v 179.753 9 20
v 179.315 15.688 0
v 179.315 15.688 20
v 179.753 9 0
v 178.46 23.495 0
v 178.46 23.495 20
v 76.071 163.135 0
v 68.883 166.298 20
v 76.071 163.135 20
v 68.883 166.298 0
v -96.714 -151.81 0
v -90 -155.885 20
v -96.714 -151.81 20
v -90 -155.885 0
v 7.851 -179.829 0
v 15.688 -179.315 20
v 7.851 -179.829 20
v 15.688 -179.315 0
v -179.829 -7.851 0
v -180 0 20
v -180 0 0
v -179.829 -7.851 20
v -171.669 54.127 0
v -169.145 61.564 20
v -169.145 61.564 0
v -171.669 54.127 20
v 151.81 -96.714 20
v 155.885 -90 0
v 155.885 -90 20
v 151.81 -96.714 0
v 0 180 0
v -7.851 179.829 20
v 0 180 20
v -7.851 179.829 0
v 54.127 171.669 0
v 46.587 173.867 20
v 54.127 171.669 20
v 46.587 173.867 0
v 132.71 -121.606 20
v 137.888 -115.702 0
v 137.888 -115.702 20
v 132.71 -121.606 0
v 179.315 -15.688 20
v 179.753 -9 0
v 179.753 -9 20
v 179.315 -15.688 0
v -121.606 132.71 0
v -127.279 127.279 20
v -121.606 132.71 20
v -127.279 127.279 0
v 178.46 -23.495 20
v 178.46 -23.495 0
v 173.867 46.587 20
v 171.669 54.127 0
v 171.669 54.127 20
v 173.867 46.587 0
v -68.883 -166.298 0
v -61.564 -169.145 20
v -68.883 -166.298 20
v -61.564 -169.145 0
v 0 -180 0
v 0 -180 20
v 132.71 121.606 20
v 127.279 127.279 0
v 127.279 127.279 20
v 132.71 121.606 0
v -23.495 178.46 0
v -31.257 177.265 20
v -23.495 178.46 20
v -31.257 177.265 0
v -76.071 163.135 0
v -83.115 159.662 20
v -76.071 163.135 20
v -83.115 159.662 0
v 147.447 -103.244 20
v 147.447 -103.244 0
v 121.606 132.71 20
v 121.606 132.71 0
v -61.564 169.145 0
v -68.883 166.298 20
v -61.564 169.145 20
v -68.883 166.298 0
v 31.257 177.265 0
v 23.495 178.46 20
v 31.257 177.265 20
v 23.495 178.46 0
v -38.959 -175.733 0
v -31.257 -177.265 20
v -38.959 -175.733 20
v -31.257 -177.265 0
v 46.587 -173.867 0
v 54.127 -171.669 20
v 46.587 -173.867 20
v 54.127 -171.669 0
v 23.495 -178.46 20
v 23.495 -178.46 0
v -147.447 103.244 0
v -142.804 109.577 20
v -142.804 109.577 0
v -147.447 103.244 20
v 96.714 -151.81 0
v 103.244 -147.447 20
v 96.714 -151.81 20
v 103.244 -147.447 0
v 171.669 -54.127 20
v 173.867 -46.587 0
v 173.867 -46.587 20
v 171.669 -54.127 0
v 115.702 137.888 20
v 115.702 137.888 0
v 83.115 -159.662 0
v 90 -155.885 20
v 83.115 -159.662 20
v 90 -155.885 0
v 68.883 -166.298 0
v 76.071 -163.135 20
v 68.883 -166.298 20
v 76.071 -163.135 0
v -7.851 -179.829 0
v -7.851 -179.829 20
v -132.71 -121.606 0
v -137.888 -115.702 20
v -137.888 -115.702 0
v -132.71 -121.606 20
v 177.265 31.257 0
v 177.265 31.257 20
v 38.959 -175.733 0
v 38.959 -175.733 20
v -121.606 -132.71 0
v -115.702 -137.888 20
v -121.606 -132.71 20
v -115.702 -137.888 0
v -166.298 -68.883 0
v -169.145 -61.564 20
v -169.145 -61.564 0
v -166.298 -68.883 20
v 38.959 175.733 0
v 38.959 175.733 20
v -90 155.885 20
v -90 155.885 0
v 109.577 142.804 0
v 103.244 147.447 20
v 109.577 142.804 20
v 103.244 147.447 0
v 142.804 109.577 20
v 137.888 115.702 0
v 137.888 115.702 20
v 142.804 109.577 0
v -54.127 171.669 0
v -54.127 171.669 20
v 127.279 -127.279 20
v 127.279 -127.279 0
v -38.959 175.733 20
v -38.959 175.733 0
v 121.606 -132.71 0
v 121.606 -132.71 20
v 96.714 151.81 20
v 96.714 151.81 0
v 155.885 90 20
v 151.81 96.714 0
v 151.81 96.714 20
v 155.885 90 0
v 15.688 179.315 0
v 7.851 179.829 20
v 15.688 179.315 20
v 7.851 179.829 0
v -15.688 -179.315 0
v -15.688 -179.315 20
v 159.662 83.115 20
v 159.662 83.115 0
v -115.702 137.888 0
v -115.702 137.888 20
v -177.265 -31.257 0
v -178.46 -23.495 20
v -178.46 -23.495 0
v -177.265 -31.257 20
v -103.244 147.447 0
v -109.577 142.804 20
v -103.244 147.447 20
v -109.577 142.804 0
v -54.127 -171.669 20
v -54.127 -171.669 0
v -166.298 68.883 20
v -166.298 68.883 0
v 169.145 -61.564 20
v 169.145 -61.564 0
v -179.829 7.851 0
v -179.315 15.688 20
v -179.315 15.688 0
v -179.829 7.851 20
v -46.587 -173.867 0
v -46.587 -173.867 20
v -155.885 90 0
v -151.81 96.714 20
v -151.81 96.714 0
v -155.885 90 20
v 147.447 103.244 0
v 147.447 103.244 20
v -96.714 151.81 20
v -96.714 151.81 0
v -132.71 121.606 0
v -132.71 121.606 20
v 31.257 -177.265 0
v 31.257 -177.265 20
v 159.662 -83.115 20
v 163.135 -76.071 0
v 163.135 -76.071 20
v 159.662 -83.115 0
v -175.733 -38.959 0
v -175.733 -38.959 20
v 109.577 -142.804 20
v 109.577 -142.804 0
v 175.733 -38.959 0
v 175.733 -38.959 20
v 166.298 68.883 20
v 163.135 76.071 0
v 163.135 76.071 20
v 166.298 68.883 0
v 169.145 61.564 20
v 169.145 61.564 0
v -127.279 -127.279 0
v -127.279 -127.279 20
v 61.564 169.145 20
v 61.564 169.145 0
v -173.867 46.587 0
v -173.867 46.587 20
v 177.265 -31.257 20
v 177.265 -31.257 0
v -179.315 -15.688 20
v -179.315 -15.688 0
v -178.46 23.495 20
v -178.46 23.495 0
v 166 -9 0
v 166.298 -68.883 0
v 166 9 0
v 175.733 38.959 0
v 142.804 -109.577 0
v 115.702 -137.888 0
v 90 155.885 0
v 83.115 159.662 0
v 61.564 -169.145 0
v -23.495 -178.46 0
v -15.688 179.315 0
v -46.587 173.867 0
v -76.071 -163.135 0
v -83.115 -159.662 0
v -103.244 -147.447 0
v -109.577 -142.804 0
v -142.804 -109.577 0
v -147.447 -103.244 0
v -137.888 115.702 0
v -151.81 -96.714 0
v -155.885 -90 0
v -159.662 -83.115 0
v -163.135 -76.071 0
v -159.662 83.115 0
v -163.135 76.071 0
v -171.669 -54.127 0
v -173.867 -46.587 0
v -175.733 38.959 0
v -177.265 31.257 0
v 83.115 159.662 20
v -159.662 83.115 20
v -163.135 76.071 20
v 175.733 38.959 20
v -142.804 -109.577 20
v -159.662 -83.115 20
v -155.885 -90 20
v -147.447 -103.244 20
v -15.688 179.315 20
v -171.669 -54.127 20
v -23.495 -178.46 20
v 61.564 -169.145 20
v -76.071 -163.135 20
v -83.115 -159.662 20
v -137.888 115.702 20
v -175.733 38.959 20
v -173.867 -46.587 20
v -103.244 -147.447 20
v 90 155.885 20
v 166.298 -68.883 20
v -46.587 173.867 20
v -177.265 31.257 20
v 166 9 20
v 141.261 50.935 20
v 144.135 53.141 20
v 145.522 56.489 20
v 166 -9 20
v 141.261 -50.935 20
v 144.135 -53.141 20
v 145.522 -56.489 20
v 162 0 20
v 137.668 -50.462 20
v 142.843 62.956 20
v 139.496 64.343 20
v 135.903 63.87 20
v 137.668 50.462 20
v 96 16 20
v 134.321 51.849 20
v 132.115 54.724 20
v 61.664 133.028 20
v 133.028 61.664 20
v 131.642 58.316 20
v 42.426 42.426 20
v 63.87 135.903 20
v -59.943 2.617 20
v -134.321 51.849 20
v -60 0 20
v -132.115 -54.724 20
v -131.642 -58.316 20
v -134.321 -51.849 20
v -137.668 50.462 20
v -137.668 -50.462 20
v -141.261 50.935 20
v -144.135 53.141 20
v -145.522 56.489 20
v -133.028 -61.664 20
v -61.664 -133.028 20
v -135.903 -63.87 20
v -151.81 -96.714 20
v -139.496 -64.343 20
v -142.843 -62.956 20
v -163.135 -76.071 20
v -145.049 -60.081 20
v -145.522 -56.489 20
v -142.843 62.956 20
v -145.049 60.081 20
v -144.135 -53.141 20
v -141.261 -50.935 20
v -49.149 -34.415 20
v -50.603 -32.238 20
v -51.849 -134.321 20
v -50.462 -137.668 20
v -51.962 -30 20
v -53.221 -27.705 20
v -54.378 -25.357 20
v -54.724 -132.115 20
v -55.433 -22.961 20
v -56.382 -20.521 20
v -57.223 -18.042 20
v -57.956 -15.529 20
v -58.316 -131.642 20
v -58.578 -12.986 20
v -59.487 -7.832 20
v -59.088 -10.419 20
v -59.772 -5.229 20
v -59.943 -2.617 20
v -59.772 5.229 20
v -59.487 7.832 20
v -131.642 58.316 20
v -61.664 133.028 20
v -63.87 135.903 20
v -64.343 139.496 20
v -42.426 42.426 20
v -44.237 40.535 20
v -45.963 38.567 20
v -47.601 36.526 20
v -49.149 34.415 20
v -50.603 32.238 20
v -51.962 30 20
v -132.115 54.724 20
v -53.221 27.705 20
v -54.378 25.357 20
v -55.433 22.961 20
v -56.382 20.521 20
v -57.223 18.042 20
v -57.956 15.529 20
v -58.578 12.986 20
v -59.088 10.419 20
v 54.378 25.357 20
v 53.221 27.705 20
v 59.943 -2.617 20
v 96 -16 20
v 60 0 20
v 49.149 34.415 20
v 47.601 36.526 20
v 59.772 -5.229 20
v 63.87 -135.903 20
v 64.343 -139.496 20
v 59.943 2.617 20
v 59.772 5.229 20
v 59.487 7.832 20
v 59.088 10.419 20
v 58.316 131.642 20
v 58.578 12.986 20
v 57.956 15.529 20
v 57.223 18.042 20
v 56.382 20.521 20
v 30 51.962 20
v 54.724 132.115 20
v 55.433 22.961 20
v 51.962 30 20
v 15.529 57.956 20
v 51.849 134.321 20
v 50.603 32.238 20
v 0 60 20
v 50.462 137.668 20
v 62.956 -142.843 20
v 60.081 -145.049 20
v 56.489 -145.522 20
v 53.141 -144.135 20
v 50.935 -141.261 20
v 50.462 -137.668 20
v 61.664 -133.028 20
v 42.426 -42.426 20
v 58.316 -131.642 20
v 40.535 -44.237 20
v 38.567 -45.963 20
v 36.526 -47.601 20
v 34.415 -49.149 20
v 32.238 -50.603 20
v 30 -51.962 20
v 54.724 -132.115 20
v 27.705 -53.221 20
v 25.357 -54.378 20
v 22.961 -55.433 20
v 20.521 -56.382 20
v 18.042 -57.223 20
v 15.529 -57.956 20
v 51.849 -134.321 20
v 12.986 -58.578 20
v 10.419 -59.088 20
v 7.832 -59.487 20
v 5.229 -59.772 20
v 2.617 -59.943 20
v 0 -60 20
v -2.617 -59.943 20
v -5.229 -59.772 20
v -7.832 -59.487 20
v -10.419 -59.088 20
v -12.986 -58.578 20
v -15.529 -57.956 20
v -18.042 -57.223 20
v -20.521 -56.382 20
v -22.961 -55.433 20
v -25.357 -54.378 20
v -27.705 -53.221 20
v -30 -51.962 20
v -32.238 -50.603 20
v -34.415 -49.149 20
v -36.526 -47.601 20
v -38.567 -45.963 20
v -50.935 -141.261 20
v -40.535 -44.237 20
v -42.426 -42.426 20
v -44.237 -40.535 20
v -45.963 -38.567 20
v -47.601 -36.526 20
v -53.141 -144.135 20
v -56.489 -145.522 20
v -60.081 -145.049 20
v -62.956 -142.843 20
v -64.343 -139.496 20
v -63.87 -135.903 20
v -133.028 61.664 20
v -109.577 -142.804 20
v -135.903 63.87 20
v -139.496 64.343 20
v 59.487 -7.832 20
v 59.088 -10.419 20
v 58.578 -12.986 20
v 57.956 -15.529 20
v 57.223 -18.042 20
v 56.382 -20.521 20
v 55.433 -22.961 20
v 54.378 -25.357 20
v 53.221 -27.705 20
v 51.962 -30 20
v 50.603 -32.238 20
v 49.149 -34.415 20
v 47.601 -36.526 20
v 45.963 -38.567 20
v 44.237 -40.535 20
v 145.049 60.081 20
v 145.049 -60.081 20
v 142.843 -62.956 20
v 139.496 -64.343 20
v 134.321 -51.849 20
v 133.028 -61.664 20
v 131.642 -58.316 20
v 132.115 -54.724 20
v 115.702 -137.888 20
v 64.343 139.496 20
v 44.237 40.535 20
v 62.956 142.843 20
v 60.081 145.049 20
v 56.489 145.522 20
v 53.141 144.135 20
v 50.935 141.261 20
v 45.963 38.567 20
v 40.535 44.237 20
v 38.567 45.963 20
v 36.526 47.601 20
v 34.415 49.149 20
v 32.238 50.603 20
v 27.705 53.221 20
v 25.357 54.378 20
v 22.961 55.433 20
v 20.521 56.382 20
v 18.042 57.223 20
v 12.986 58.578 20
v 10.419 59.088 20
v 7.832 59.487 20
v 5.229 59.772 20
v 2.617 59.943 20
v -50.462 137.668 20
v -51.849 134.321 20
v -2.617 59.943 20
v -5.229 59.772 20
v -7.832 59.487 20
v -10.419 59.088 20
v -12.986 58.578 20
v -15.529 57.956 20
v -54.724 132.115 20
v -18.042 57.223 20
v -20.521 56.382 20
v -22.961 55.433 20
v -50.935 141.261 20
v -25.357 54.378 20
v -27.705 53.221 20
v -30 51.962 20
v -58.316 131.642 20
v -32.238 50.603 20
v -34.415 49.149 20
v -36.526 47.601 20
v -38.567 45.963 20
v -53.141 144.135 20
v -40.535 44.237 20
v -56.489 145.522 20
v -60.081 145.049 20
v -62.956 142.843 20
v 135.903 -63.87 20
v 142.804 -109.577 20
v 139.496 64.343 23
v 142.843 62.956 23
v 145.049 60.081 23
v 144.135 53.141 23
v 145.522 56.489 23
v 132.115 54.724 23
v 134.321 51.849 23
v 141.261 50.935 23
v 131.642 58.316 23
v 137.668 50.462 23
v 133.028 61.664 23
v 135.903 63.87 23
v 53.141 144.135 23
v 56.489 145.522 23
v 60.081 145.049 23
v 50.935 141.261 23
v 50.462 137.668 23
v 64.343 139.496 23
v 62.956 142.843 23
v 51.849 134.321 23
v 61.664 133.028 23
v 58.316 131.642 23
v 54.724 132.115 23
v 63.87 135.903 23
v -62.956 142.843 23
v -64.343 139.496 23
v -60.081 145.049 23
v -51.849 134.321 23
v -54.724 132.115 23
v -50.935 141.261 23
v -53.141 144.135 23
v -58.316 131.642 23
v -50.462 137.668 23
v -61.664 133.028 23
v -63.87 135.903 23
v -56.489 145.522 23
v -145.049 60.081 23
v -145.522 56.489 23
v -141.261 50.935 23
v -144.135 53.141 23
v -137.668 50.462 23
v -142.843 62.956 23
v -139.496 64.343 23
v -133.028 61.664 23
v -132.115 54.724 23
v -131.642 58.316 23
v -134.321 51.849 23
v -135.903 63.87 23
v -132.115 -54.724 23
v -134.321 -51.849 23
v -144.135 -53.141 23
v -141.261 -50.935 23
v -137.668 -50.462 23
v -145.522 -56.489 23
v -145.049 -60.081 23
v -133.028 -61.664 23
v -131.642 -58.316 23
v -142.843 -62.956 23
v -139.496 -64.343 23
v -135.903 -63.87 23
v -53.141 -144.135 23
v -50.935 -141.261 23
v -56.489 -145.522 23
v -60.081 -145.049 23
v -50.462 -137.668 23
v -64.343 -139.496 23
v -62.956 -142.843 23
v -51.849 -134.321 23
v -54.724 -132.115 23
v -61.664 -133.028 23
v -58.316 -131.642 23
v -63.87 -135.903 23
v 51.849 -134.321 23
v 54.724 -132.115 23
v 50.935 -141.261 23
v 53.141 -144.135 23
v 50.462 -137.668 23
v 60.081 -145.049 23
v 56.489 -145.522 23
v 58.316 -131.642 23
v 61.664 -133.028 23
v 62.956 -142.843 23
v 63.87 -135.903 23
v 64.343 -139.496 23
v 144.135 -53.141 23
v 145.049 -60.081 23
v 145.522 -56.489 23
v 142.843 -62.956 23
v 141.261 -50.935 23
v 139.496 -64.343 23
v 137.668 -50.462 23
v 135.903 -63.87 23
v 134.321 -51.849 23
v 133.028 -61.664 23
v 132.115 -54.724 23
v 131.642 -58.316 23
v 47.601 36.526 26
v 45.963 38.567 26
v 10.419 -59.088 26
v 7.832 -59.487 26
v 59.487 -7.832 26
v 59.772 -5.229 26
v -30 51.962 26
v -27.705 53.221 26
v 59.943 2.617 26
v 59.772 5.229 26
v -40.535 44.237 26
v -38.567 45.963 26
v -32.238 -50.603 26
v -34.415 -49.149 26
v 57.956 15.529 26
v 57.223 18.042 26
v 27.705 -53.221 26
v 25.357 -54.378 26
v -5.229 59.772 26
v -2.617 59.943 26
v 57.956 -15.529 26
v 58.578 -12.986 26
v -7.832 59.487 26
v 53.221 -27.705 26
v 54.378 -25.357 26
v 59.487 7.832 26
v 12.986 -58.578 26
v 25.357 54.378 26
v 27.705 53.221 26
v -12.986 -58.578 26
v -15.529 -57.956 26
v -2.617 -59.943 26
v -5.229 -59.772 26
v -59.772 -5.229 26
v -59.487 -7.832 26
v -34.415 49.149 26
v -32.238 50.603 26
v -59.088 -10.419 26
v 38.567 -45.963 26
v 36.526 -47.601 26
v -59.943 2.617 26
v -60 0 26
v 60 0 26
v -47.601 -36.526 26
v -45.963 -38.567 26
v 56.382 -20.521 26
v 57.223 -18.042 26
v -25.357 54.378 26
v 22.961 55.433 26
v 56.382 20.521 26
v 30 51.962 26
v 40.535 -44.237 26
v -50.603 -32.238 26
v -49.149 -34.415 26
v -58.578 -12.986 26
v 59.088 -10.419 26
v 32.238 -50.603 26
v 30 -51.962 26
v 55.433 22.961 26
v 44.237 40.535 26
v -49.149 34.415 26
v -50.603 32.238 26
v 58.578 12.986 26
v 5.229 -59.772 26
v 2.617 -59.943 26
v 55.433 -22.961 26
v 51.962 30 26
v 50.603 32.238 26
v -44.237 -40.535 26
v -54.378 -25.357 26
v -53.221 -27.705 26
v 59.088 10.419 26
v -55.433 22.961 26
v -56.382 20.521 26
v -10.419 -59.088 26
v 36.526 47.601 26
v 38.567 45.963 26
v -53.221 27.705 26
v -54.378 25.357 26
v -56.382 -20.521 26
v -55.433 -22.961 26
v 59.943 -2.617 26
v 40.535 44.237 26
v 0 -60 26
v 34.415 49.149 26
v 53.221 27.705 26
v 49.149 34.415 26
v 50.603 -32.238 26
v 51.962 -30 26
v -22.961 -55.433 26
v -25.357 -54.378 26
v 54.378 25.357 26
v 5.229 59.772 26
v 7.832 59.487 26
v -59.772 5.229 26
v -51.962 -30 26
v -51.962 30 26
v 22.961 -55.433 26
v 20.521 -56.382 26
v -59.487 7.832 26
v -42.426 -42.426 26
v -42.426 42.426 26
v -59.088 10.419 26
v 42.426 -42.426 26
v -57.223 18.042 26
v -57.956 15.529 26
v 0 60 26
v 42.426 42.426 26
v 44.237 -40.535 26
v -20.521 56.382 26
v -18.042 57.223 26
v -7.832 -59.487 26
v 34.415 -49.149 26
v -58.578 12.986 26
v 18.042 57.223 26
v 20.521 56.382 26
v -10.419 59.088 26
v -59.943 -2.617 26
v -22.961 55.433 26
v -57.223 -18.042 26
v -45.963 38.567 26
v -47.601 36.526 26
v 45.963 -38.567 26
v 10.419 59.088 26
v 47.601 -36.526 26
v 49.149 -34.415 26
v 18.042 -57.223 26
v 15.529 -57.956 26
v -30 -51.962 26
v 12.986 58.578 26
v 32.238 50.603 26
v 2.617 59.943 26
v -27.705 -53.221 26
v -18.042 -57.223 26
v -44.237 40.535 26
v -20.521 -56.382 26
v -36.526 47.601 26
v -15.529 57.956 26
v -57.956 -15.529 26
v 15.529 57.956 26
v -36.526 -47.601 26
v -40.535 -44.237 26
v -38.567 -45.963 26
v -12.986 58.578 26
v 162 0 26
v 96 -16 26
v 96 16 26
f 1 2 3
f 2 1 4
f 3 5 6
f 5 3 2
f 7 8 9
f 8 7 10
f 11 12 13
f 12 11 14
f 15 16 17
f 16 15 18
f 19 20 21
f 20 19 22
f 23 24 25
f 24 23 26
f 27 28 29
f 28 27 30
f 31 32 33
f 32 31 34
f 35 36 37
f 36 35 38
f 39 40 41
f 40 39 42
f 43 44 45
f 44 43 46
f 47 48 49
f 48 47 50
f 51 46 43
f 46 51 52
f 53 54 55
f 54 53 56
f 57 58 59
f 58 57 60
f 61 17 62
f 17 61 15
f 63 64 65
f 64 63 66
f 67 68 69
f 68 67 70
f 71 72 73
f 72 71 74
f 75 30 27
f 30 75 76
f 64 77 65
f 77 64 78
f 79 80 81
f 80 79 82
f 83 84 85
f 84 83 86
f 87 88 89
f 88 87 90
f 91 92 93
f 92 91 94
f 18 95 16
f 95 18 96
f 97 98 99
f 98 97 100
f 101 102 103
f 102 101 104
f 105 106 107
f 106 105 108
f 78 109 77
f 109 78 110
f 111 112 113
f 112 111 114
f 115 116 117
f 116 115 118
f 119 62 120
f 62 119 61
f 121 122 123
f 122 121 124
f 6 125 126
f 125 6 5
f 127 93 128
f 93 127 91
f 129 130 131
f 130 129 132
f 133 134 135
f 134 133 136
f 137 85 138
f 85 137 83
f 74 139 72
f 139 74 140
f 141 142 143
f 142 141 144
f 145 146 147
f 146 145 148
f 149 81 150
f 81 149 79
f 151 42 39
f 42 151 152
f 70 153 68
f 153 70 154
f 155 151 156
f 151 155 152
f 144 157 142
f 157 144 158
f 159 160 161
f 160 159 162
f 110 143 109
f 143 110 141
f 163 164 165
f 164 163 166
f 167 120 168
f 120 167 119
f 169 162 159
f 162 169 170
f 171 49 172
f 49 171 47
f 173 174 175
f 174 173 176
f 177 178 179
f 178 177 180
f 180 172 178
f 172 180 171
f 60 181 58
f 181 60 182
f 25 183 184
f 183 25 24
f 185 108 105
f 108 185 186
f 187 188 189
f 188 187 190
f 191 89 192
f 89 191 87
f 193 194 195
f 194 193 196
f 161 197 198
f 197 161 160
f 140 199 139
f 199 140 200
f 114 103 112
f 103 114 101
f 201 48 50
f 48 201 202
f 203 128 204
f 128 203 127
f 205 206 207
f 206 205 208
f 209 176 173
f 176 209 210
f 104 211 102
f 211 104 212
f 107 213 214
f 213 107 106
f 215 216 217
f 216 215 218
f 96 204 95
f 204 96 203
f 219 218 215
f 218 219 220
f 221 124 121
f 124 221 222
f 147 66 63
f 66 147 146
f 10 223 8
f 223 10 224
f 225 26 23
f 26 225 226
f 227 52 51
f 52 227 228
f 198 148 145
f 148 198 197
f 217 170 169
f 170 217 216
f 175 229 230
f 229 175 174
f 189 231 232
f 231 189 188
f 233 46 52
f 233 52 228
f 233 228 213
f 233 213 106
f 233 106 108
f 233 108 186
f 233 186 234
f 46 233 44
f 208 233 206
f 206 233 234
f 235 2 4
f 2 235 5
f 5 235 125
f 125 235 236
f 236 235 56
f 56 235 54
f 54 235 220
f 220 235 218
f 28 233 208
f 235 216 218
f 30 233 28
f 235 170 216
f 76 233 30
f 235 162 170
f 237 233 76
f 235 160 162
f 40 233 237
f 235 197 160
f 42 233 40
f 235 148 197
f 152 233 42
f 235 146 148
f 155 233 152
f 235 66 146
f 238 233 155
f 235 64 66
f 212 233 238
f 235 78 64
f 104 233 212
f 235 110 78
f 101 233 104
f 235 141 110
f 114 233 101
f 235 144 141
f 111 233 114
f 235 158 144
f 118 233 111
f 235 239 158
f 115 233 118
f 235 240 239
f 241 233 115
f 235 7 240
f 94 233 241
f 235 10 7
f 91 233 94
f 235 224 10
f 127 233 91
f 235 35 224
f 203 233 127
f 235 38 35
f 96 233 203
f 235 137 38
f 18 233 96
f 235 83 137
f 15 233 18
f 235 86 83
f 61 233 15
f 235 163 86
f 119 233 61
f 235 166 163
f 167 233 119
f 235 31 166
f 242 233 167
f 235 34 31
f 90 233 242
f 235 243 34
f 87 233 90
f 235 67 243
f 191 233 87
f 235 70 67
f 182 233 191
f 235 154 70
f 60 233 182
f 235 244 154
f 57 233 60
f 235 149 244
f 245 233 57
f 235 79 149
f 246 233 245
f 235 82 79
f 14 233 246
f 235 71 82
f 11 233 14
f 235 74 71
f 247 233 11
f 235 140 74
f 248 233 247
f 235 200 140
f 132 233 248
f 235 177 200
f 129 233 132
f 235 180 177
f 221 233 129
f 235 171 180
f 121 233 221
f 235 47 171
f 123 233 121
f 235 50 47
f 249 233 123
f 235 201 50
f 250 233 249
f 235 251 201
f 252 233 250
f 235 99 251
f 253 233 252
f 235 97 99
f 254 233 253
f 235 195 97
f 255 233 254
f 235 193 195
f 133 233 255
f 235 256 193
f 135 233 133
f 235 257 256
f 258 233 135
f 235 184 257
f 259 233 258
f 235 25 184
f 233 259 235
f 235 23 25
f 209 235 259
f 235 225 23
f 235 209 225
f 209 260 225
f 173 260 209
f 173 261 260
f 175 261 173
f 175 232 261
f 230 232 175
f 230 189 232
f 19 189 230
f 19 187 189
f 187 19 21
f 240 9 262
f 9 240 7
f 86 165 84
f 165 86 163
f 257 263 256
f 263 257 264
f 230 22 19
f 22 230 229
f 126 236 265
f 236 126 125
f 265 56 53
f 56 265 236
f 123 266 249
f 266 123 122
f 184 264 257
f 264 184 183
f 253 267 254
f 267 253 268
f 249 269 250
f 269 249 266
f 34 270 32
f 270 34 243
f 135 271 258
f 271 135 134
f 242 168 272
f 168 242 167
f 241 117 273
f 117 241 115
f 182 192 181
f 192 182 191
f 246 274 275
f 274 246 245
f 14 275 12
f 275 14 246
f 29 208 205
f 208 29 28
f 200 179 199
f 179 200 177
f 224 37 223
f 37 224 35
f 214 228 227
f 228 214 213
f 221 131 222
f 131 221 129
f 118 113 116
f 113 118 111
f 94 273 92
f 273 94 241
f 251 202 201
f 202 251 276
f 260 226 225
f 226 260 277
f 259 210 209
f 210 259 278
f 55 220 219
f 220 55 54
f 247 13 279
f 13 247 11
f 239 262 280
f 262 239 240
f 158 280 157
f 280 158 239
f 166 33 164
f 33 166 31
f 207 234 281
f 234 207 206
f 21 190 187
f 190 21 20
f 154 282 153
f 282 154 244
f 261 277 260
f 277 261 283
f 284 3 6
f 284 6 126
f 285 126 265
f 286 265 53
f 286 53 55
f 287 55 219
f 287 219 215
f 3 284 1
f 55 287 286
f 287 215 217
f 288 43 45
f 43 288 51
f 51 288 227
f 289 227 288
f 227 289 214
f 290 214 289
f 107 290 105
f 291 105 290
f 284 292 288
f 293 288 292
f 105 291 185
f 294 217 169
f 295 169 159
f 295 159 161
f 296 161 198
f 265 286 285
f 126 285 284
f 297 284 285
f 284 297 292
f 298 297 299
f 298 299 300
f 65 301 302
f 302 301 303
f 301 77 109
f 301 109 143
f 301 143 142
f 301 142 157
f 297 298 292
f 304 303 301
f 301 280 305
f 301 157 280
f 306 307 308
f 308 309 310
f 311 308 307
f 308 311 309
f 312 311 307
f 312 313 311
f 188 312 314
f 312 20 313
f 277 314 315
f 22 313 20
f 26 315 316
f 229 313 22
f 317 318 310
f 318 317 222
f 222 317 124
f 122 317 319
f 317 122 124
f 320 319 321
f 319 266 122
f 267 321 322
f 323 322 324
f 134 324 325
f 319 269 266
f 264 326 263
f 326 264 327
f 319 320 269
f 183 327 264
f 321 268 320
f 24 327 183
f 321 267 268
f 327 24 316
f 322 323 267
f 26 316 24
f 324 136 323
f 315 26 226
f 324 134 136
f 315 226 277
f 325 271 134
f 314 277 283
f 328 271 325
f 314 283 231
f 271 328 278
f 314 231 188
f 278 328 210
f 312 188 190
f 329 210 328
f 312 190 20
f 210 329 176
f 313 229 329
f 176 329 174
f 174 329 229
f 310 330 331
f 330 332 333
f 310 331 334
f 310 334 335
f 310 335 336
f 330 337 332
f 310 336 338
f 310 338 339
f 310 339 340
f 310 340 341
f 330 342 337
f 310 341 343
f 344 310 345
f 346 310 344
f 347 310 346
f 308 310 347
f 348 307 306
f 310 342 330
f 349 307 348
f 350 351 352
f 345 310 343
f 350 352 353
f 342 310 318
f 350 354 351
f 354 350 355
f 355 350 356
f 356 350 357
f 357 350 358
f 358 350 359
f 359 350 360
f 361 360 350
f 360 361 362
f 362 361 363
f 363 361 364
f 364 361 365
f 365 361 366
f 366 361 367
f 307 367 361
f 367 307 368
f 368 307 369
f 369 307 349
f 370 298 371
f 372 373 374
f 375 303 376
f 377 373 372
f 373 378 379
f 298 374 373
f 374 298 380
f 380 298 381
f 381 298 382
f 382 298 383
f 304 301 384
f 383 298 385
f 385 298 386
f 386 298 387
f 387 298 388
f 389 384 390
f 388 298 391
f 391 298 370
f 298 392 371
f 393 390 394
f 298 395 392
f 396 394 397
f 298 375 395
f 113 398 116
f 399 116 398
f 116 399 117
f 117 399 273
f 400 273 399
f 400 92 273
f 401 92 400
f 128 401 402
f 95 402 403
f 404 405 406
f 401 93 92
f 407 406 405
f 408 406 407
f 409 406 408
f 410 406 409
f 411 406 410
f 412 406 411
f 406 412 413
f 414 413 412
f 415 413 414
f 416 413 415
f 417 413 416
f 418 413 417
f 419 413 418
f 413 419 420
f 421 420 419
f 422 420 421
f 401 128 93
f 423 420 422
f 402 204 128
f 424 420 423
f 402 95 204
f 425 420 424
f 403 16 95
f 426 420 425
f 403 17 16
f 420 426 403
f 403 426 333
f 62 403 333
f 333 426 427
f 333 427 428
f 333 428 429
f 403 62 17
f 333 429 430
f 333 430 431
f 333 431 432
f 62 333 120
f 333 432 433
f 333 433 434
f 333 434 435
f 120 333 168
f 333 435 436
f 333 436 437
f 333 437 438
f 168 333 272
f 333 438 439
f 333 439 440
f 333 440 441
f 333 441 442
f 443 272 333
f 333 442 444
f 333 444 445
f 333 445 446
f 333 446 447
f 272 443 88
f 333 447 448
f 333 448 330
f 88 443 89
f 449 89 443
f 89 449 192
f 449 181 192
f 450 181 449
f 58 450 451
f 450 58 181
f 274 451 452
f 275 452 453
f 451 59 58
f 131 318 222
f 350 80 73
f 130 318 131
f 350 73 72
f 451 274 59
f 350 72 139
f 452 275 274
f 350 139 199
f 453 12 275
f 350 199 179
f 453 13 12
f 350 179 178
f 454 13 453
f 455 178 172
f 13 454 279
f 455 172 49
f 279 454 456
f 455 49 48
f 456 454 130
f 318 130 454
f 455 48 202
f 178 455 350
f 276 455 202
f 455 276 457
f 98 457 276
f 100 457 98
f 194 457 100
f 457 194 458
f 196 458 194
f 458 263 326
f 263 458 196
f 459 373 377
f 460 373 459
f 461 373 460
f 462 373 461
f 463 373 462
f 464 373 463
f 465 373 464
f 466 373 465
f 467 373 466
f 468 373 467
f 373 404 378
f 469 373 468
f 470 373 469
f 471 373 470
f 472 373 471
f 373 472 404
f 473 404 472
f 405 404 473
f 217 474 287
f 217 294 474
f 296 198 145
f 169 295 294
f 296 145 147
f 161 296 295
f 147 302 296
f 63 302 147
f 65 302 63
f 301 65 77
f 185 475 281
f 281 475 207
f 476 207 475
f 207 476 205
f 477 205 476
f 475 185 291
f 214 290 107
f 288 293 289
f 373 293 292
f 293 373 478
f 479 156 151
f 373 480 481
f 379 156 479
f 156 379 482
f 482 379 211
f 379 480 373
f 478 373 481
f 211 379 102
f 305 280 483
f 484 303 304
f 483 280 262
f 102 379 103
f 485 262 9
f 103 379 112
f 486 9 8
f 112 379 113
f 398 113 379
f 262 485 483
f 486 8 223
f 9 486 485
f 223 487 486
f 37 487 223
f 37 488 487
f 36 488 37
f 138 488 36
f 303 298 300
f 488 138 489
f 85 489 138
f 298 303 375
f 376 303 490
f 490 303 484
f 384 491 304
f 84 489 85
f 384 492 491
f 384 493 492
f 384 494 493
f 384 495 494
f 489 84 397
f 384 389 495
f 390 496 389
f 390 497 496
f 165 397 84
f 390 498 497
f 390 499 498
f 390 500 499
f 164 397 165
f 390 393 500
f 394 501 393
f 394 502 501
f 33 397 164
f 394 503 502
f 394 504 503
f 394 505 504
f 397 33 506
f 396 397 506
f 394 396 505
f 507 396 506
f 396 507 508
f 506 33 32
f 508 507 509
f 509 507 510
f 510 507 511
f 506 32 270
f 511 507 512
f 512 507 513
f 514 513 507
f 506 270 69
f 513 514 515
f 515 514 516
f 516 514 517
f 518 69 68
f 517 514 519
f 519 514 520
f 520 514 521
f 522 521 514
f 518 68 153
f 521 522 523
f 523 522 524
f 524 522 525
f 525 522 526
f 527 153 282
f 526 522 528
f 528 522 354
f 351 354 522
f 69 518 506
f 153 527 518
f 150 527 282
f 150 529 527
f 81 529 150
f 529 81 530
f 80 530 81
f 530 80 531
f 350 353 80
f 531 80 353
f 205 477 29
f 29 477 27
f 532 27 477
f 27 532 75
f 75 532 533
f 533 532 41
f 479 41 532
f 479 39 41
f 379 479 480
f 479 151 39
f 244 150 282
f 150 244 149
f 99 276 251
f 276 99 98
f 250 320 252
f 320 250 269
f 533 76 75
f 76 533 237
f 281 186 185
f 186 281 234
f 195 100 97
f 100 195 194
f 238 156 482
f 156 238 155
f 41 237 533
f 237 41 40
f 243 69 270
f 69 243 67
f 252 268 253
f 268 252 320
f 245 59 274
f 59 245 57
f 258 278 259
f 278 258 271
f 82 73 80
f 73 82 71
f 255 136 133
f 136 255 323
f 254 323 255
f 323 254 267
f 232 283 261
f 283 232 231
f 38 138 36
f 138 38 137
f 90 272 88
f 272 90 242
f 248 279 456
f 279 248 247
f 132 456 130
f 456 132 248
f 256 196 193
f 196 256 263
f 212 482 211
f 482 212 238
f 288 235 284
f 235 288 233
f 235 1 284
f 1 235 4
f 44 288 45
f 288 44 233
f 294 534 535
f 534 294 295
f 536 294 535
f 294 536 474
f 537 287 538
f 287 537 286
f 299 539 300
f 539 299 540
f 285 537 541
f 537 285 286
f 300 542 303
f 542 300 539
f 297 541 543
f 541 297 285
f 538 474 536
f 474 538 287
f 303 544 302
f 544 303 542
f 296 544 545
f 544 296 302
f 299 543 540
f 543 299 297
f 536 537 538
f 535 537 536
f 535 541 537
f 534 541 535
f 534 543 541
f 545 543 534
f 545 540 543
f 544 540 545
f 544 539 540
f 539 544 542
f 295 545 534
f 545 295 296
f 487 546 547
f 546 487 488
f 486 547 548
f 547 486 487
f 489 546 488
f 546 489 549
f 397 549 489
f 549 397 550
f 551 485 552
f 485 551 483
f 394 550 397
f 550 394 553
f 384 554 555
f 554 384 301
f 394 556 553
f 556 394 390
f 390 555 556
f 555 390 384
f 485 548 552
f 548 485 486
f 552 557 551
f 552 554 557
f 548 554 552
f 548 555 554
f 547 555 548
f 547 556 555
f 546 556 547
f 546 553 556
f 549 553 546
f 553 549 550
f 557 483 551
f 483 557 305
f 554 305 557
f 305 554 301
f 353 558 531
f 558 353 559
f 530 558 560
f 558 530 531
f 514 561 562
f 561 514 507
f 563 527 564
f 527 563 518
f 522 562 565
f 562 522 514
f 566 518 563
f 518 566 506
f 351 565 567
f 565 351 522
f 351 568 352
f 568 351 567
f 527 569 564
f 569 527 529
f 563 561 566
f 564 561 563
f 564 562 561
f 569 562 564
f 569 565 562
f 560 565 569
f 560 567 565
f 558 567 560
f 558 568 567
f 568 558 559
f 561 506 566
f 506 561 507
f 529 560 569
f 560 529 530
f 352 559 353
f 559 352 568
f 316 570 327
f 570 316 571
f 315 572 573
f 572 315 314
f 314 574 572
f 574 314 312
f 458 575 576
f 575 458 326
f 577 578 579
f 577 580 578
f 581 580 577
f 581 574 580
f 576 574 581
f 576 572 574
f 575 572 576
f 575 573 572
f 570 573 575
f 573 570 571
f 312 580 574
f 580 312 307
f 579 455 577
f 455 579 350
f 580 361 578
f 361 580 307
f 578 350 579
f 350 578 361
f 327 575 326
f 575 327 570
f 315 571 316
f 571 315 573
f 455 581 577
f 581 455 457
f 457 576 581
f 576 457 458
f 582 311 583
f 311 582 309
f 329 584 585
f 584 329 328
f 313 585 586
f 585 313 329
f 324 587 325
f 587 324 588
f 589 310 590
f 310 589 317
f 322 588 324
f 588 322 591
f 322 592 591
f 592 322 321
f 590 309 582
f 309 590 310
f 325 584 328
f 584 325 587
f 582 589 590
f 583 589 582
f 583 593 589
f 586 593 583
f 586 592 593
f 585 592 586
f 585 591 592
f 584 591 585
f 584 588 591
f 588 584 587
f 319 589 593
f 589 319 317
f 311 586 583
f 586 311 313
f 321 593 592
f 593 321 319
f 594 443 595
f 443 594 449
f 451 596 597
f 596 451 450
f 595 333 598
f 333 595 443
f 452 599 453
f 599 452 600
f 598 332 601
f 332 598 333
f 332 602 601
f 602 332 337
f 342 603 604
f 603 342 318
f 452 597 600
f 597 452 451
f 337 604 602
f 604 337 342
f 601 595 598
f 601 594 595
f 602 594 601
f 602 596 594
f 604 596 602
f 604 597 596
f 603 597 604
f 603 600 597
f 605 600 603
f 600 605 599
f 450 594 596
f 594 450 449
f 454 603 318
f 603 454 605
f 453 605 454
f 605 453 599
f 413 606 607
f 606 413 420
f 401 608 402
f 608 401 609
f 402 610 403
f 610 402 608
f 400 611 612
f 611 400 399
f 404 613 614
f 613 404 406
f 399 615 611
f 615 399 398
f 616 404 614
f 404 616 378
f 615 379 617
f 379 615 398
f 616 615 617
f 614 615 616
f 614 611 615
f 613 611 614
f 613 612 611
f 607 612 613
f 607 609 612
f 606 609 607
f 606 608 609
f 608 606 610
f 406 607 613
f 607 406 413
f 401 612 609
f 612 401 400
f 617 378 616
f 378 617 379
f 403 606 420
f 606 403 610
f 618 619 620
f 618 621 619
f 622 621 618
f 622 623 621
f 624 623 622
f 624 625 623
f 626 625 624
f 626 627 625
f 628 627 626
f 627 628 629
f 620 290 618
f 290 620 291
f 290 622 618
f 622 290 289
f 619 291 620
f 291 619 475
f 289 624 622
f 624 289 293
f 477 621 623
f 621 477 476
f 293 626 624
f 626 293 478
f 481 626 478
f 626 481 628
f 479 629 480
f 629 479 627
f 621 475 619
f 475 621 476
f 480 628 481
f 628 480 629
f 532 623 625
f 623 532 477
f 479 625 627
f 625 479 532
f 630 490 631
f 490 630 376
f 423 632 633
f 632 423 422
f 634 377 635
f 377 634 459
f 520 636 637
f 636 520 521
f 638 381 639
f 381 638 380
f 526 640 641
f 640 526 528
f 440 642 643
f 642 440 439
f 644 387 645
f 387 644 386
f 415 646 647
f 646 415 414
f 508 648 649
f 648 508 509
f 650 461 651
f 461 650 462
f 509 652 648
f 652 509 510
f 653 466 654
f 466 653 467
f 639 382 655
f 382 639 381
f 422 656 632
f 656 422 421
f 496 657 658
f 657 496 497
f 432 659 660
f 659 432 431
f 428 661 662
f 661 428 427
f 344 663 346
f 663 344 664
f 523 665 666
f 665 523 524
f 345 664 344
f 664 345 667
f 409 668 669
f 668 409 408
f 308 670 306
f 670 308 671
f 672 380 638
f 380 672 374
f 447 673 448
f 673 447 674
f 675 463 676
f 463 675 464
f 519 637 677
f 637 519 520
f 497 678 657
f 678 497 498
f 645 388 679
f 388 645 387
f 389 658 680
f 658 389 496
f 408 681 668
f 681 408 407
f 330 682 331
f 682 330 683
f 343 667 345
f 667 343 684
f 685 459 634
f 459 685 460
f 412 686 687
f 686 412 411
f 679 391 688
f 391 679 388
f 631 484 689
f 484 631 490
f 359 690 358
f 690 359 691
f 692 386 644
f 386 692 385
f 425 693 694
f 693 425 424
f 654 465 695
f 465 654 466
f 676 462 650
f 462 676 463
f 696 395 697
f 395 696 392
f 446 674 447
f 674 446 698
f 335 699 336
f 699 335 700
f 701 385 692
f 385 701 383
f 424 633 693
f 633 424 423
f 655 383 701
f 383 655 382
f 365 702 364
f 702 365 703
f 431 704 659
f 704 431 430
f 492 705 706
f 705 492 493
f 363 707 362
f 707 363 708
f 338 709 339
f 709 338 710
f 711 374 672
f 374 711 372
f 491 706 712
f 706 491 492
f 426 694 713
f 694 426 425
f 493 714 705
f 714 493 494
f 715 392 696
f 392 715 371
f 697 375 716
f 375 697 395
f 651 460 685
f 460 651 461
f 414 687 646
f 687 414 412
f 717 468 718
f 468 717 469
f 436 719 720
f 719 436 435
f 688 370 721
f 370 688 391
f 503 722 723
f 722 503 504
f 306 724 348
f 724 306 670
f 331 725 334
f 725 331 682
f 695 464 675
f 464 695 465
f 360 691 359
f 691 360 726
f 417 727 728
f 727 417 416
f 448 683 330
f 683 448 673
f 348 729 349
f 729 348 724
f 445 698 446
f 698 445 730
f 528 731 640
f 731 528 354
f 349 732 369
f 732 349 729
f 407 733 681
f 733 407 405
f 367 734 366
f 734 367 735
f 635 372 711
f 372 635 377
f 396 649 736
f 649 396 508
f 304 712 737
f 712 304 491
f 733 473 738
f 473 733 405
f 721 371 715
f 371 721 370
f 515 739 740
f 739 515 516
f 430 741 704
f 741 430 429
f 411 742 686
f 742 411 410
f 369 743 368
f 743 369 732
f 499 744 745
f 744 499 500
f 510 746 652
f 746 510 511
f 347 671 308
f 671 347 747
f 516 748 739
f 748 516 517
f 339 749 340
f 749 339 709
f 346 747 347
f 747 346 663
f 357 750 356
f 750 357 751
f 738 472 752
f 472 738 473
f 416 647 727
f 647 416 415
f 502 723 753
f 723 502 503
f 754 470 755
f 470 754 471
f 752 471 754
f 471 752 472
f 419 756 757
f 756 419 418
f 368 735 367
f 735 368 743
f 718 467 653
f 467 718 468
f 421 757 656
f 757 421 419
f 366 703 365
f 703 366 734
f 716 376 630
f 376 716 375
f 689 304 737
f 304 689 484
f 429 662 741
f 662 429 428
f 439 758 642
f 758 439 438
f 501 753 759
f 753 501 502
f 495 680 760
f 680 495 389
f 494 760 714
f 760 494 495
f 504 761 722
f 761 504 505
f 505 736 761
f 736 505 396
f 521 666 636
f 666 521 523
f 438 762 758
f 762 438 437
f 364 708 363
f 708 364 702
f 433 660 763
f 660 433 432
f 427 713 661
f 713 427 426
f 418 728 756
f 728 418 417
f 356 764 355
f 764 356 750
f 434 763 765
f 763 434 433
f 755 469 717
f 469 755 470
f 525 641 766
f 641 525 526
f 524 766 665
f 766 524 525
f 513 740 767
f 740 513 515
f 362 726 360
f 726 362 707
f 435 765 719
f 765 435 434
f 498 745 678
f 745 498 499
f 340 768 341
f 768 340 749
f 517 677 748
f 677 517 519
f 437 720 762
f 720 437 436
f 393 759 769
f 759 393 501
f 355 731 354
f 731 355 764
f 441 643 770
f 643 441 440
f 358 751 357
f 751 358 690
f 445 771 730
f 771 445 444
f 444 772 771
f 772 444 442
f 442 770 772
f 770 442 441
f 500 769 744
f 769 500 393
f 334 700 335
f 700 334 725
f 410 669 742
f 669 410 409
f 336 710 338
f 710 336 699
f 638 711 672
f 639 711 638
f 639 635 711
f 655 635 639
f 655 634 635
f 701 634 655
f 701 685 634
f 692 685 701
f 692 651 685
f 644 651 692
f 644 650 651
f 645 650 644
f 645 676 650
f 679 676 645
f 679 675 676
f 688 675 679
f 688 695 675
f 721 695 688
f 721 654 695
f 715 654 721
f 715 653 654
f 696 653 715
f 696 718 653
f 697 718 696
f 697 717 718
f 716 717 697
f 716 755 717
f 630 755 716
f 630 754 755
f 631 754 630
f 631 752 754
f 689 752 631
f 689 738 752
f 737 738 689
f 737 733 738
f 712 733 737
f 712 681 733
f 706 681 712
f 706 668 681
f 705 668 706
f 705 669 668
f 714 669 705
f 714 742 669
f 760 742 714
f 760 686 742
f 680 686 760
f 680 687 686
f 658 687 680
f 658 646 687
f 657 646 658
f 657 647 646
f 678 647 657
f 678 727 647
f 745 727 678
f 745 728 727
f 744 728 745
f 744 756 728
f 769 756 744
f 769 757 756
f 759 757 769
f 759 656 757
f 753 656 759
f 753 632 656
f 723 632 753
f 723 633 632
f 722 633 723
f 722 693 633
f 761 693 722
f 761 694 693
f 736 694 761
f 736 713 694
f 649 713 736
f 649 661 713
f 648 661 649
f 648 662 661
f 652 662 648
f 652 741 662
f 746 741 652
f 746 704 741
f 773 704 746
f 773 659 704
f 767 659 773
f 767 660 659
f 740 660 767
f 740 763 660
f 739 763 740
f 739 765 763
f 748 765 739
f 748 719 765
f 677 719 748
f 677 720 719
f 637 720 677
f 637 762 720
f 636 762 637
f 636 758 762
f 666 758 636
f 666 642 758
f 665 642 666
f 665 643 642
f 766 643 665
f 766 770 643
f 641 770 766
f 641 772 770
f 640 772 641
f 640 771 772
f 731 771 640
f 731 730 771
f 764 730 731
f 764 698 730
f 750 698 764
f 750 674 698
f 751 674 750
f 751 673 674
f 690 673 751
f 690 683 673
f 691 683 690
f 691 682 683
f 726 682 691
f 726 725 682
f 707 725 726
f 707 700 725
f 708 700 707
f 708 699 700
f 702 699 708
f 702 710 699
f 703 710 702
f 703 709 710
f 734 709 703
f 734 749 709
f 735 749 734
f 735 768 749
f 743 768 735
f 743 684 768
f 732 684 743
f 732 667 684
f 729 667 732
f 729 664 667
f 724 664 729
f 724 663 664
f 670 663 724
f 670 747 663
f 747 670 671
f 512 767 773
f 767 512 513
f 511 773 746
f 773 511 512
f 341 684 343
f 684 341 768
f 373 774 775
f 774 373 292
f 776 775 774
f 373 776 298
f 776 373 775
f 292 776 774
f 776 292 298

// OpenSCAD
$fn=144;
module rotator_plate() {
  union() {
    difference() {
      cylinder(d=360,h=20);
      // index notch through the rim at +X
      translate([166,-9,-1]) cube([20,18,22]);
    }
    translate([0,0,20]) cylinder(d=120,h=6);
    for (a=[22.5:45:337.5]) rotate([0,0,a]) translate([150,0,20]) cylinder(d=14,h=3,$fn=12);
    // raised pointer from the hub to the notch
    translate([0,0,20]) linear_extrude(height=6) polygon([[96,-16],[96,16],[162,0]]);
  }
}
rotator_plate();
